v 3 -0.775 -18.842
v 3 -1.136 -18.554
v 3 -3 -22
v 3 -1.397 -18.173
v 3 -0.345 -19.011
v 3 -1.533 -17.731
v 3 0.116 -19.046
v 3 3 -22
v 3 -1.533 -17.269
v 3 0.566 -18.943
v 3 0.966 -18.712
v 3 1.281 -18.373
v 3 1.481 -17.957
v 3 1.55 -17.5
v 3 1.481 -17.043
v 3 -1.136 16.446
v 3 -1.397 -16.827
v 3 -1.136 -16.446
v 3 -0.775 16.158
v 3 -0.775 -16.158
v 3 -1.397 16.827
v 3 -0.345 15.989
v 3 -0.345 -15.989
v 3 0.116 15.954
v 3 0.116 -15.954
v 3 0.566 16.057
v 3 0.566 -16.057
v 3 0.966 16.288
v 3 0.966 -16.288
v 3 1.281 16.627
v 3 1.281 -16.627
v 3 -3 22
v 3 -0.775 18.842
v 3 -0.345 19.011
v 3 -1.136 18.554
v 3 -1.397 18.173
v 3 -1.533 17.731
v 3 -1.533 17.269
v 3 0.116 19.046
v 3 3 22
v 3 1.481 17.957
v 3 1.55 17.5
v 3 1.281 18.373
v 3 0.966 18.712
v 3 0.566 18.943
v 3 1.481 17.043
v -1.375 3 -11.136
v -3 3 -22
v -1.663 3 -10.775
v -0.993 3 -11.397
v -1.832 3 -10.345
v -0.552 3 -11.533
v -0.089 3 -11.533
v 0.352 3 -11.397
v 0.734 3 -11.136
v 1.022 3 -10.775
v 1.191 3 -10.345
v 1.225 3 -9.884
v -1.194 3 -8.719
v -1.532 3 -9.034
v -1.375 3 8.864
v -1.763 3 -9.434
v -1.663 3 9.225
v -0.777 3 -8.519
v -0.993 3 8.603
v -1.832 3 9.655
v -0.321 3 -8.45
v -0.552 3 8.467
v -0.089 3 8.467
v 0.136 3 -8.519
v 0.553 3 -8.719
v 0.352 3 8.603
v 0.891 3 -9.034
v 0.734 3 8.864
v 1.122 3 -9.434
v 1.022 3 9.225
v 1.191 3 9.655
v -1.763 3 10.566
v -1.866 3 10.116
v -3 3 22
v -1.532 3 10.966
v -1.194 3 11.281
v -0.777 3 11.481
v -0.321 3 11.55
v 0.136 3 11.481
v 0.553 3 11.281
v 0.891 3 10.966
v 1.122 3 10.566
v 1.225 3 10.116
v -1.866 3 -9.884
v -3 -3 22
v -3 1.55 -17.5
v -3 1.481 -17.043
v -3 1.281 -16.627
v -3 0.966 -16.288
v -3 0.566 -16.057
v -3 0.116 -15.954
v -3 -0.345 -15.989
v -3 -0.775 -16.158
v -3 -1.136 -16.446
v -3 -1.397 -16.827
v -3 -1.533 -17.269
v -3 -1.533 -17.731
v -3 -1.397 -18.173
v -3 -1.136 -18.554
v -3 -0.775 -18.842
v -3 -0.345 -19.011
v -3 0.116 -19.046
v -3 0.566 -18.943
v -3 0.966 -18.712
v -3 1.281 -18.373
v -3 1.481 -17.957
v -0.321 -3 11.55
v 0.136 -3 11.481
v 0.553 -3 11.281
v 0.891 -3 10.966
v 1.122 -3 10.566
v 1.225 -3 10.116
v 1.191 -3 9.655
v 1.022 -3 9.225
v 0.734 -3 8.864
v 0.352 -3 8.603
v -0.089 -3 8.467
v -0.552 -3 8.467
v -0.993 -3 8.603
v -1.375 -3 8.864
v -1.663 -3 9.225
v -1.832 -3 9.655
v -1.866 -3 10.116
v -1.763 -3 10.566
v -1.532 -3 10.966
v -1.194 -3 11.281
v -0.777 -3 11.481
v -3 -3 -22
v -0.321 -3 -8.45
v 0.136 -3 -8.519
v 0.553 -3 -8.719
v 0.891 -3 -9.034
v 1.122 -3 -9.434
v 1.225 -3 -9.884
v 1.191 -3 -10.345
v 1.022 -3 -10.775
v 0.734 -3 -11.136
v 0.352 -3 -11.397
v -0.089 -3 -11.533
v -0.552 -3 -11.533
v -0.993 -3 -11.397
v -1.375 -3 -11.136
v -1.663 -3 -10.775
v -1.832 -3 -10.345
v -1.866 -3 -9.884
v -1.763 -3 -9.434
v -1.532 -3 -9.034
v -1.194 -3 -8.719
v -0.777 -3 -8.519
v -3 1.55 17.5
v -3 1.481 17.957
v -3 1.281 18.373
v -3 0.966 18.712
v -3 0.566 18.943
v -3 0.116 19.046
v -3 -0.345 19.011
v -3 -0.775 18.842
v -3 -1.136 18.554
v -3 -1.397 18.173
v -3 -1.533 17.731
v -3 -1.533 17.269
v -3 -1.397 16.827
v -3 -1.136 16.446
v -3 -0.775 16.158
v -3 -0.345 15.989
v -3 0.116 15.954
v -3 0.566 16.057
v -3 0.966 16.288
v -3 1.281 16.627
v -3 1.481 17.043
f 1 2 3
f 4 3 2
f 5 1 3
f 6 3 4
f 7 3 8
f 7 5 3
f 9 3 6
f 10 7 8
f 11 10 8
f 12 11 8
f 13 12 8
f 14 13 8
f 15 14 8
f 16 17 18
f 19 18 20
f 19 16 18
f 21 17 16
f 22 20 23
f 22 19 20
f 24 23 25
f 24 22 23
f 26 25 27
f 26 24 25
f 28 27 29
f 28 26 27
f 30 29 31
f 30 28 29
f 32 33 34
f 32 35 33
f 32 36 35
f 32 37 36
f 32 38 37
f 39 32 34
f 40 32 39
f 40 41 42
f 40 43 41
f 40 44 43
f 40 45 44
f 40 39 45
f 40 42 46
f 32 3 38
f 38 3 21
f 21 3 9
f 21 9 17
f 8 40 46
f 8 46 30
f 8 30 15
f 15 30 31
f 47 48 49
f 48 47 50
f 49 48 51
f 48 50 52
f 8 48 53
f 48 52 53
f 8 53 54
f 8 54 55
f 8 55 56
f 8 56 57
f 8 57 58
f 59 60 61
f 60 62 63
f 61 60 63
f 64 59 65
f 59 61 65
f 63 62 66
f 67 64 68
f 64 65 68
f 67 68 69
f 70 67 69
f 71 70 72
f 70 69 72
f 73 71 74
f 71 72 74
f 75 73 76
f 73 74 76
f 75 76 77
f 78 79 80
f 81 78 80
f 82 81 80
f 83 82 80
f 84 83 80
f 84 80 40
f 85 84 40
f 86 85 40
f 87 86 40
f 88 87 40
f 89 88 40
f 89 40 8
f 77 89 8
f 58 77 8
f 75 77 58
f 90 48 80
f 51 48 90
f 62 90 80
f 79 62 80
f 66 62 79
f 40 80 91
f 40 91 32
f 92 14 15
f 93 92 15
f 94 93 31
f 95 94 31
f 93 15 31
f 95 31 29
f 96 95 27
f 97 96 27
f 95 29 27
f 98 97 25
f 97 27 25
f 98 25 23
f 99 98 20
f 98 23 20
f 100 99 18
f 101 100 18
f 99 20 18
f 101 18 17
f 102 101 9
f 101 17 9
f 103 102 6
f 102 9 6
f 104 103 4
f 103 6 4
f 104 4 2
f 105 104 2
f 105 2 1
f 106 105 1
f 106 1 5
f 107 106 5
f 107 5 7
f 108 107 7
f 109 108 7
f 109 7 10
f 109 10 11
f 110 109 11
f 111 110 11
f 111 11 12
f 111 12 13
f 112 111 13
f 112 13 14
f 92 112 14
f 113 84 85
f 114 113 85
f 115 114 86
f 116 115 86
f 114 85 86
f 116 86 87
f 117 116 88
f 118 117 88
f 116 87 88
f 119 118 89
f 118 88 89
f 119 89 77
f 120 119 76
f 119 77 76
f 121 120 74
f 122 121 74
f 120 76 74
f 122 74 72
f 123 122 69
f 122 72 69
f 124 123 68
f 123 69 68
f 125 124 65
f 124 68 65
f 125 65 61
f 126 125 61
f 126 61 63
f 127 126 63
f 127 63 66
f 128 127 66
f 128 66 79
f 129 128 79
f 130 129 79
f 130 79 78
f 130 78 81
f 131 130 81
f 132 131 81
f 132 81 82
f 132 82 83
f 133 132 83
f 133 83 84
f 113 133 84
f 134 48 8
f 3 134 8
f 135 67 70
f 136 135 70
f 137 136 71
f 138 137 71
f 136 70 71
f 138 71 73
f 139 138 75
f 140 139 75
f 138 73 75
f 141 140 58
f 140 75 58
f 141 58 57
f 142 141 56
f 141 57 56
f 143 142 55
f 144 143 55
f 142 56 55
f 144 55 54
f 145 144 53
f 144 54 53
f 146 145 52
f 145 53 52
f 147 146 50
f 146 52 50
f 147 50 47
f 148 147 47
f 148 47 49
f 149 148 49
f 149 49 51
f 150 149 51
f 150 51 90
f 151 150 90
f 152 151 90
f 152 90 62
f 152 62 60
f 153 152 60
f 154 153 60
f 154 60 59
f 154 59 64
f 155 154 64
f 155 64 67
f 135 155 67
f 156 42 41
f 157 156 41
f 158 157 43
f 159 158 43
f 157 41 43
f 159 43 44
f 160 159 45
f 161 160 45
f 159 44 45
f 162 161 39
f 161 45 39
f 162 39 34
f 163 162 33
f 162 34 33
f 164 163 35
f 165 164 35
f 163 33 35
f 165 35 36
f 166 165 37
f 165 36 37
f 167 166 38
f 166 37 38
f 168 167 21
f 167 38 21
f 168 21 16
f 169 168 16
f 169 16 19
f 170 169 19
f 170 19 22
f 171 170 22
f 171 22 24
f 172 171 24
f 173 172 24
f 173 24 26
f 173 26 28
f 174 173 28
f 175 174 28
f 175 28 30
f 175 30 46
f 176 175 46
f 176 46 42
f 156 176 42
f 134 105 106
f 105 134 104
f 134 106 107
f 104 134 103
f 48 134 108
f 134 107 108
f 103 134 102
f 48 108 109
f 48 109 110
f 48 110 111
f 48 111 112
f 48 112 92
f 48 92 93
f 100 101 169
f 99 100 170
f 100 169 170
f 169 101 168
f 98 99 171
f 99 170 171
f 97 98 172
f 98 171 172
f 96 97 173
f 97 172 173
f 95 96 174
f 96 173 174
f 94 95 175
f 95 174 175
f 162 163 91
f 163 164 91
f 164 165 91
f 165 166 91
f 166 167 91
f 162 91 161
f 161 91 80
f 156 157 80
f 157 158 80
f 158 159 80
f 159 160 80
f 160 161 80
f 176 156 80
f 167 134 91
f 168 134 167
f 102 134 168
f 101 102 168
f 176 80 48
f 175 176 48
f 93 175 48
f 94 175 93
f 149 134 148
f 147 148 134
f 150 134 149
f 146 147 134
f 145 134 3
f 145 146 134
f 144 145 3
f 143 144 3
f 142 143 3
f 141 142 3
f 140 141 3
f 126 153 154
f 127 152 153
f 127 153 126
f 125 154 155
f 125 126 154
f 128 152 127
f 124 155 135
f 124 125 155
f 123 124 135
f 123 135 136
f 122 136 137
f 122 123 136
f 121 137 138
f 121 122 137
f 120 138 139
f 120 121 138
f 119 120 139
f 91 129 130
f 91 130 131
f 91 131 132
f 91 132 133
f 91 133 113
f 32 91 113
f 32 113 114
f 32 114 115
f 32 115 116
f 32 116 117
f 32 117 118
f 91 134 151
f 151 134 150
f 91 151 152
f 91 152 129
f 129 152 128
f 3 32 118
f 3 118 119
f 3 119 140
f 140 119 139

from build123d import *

# Parameters (mm, degrees)
SKETCH_1_W          = 6
SKETCH_1_H          = 6
EXTRUDE_1_DEPTH     = 22
SKETCH_3_R          = 1.55
CUT_EXTRUDE_1_DEPTH = 44
SKETCH_6_R          = 1.55
CUT_EXTRUDE_2_DEPTH = 10


with BuildPart() as part:
    # 草图1 → 凸台-拉伸1 (new, symmetric)
    with BuildSketch(Plane.XY):
        Rectangle(SKETCH_1_W, SKETCH_1_H)
    extrude(amount=EXTRUDE_1_DEPTH, both=True)

    # 草图3 → 切除-拉伸1 (cut)
    with BuildSketch(Plane(origin=(3, 0, 0), x_dir=(0, 0, -1), z_dir=(1, 0, 0))):
        with Locations(Location((-17.5, 0, 0), (0, 0, 90))):
            Circle(SKETCH_3_R)
        with Locations(Location((17.5, 0, 0), (0, 0, 90))):
            Circle(SKETCH_3_R)
    extrude(amount=-CUT_EXTRUDE_1_DEPTH, mode=Mode.SUBTRACT)

    # 草图6 → 切除-拉伸2 (cut)
    with BuildSketch(Plane(origin=(0, 3, 0), x_dir=(1, 0, 0), z_dir=(0, 1, 0))):
        with Locations(Location((-0.320508076, -10, 0), (0, 0, 270))):
            Circle(SKETCH_6_R)
        with Locations(Location((-0.320508076, 10, 0), (0, 0, 270))):
            Circle(SKETCH_6_R)
    extrude(amount=-CUT_EXTRUDE_2_DEPTH, mode=Mode.SUBTRACT)


solid = part.part
